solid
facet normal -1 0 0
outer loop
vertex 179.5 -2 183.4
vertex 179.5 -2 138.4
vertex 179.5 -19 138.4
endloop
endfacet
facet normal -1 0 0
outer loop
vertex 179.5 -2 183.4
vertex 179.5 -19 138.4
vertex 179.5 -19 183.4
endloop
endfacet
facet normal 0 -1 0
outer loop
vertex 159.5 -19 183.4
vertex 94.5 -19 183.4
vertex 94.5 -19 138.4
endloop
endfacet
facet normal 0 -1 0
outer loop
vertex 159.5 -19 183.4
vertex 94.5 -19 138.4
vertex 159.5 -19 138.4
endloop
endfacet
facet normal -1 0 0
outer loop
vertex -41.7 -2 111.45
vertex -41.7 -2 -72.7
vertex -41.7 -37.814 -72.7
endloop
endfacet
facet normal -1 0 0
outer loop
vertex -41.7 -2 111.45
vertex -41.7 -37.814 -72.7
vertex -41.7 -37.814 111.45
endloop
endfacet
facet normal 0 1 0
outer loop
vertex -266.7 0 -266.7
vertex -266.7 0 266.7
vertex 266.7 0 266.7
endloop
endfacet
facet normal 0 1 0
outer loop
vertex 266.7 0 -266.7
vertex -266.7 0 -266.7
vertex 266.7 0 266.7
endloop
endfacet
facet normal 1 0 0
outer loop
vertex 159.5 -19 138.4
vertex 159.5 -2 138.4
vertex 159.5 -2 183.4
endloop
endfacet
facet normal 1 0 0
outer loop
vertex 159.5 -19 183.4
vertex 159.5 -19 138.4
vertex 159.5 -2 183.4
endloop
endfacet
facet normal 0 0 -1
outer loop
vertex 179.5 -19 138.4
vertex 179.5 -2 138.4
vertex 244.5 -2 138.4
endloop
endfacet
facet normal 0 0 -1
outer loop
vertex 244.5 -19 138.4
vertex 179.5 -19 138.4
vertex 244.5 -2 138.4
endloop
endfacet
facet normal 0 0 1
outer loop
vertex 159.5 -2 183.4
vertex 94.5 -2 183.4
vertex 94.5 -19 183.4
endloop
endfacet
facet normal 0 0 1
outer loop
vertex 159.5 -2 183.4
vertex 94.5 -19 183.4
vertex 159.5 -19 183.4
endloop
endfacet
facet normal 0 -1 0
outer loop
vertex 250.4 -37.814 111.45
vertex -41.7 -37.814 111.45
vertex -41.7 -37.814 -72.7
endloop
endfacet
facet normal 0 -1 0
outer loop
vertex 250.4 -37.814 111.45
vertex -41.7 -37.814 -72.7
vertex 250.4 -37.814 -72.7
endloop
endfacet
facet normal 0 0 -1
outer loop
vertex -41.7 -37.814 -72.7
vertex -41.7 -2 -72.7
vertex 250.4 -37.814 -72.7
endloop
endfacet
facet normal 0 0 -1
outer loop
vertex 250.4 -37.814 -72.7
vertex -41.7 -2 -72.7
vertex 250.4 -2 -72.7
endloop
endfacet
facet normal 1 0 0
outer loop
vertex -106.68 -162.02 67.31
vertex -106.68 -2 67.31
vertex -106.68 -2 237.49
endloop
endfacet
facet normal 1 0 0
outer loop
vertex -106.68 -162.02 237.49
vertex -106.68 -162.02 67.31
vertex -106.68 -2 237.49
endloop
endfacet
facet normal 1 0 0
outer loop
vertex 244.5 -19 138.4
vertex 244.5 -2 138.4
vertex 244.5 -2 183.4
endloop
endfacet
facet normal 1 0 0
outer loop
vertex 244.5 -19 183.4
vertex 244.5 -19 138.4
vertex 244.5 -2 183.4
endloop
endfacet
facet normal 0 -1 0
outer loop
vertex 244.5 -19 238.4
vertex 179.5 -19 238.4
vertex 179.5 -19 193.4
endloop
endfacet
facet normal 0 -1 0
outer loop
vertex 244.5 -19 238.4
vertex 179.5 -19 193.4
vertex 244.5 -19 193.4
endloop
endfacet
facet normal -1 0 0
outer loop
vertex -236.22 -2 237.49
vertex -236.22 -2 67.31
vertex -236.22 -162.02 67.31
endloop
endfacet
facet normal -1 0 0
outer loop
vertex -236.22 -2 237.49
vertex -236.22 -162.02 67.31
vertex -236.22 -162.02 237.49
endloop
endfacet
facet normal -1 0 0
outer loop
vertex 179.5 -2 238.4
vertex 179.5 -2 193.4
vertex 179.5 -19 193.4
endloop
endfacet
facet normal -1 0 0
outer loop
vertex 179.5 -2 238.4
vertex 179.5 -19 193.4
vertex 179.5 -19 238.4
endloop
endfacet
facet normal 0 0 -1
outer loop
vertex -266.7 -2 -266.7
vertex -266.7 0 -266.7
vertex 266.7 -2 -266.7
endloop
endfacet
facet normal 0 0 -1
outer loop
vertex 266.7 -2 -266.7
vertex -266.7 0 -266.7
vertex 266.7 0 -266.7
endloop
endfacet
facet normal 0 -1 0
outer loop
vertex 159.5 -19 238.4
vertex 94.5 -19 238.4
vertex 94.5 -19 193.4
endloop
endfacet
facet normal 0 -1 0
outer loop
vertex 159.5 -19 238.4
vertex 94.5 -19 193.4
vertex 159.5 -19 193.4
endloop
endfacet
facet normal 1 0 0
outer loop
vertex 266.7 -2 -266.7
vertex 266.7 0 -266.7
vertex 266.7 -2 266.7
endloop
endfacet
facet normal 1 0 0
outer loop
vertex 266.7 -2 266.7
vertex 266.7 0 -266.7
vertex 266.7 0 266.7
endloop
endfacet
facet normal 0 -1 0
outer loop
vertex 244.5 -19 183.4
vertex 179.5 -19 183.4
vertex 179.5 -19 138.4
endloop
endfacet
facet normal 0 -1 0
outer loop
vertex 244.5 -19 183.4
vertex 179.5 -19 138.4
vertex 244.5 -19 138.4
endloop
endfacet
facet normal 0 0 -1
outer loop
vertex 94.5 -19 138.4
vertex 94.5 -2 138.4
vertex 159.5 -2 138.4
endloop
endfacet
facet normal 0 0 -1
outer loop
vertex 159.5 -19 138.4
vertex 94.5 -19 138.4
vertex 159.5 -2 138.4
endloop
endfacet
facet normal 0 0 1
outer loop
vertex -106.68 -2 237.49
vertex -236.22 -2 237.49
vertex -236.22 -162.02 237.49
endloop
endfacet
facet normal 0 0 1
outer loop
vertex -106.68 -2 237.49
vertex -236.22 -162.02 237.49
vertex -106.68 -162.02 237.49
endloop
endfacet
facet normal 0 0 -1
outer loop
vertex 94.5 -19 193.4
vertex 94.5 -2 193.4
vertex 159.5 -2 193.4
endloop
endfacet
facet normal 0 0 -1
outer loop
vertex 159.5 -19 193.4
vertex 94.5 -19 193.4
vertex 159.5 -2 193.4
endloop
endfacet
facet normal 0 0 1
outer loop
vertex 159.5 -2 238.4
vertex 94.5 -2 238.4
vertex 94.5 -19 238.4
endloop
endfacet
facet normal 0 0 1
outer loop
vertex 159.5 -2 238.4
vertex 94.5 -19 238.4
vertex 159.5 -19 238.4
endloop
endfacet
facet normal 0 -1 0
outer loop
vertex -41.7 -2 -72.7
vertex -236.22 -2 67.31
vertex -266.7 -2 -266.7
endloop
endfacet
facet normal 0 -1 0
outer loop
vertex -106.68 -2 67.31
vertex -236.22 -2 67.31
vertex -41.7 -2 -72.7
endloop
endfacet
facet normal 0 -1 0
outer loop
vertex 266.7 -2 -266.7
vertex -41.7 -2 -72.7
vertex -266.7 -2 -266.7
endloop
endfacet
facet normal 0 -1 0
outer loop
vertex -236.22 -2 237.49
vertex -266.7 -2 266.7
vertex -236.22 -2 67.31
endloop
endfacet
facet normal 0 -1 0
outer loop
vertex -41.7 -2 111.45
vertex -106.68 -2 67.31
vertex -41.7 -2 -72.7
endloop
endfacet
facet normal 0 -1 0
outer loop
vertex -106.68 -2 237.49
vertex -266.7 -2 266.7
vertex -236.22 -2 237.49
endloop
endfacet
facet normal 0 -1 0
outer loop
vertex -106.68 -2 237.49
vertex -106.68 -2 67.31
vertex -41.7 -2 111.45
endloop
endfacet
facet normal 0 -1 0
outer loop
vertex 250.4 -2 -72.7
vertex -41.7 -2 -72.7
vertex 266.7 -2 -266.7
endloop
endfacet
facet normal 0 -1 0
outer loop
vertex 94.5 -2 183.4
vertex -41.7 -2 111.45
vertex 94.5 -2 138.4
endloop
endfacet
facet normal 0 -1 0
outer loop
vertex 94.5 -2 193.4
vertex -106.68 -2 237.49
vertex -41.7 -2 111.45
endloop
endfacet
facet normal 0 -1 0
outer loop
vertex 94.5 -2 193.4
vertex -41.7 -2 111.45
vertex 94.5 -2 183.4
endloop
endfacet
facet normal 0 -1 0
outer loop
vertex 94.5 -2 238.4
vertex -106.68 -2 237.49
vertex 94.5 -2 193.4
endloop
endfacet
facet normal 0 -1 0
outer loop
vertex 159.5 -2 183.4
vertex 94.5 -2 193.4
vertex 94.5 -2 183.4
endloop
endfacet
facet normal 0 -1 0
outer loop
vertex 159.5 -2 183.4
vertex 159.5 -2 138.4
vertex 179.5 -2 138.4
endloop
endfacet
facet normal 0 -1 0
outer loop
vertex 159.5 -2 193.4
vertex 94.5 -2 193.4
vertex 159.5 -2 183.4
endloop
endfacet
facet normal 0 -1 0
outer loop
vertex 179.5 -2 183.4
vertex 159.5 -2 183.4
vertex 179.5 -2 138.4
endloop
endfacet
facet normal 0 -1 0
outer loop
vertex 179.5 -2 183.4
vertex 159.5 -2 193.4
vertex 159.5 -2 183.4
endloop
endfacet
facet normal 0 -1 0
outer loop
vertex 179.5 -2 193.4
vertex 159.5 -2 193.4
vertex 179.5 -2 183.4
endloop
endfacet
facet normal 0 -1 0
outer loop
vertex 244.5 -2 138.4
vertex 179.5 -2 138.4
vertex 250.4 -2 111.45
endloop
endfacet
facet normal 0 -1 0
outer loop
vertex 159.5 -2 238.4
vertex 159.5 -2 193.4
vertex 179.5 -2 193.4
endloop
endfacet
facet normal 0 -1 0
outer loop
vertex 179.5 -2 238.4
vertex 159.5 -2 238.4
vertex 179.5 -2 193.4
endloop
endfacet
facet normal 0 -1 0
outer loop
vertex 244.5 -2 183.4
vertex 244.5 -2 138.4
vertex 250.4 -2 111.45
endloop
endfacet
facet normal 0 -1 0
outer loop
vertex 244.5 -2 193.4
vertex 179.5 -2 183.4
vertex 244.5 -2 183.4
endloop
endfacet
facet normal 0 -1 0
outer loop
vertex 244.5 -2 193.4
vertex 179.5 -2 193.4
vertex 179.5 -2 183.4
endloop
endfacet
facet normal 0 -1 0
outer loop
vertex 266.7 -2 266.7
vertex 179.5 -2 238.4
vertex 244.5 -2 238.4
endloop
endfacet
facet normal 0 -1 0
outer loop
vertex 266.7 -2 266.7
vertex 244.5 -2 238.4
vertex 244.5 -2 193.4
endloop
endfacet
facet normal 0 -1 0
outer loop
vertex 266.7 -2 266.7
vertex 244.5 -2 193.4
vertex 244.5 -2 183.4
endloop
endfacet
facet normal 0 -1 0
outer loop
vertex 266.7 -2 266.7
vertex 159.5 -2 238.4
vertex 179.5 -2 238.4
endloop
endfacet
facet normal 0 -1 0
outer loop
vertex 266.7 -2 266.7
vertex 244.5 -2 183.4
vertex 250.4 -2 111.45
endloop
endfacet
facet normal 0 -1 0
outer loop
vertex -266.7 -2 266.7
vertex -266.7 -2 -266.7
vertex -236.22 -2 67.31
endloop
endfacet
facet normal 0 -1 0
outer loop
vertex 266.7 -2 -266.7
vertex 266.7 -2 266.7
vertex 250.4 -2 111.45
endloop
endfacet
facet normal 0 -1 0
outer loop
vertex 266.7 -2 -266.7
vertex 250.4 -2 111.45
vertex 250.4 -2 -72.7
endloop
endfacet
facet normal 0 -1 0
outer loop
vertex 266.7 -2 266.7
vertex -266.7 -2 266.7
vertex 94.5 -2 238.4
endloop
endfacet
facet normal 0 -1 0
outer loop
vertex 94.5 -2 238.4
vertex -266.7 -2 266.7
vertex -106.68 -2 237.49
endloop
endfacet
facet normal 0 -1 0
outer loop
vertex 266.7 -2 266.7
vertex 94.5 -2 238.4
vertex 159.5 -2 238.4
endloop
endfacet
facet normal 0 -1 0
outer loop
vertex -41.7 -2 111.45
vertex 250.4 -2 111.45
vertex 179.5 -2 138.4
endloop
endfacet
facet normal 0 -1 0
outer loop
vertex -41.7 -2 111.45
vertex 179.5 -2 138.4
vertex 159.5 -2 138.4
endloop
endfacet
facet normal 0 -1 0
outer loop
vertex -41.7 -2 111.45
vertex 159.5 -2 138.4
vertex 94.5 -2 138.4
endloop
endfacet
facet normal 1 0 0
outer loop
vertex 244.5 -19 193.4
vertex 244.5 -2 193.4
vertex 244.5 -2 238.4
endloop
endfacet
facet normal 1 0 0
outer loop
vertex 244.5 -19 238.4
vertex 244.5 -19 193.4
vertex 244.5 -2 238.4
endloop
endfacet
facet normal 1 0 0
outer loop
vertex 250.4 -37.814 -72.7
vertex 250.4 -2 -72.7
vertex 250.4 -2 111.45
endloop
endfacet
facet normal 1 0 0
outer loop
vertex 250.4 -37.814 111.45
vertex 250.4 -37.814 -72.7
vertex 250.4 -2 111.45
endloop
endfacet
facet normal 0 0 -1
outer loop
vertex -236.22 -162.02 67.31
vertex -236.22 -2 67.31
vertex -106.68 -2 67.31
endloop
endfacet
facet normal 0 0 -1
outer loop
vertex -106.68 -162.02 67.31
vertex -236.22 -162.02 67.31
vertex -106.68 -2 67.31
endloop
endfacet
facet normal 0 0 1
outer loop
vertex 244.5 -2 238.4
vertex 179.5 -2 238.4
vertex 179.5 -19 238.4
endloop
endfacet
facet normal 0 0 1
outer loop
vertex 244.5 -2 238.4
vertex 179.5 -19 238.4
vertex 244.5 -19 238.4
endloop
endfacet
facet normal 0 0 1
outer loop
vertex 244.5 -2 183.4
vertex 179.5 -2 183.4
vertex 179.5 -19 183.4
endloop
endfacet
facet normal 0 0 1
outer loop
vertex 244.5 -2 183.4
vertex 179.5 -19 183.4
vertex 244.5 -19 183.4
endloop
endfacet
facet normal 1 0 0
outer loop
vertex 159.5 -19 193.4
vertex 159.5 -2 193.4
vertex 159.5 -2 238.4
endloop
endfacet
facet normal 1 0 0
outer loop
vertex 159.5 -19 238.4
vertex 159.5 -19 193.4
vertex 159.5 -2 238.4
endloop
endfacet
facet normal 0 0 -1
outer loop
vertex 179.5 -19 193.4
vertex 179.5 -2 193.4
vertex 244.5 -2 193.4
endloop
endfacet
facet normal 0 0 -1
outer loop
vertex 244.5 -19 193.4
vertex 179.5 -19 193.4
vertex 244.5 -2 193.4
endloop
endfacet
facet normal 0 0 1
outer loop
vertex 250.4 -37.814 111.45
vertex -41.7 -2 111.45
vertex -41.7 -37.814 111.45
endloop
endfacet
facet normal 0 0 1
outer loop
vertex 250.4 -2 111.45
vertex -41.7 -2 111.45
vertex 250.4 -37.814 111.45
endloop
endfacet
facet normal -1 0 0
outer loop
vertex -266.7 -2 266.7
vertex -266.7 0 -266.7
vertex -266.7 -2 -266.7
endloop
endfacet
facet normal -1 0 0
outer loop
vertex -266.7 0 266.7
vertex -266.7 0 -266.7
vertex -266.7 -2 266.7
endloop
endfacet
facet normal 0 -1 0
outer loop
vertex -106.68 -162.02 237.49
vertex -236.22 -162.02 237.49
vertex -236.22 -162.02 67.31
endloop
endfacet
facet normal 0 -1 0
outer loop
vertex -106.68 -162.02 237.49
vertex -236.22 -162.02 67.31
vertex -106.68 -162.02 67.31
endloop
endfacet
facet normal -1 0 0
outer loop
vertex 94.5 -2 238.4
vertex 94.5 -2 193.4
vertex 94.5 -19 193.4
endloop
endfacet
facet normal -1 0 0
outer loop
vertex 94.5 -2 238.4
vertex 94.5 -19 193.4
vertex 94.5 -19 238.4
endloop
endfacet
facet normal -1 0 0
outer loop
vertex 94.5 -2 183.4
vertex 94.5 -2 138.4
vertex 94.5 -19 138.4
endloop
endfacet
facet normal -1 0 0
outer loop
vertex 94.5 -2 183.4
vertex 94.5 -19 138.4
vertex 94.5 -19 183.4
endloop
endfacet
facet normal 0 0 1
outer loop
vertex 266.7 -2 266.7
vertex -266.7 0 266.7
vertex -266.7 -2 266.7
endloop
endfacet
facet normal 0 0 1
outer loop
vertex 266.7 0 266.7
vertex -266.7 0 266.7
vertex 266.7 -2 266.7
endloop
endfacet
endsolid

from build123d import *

# Parameters (mm, degrees)
F0_W     = 533.4
F0_H     = 533.4
F1_DEPTH = 2
F2_W     = 292.1
F2_H     = 184.15
F3_DEPTH = 35.814
F4_W     = 65
F4_H     = 45
F5_DEPTH = 17
F6_W     = 129.54
F6_H     = 170.18
F7_DEPTH = 160.02


with BuildPart() as f1:
    # F0 (on Front) → F1 (new body)
    with BuildSketch(Plane.XZ):
        Rectangle(F0_W, F0_H)
    extrude(amount=F1_DEPTH)

    # F2 (on face) → F3 (join)
    with BuildSketch(Plane.XZ.offset(2)):
        with Locations((104.35, 19.375)):
            Rectangle(F2_W, F2_H)
    extrude(amount=F3_DEPTH)

    # F4 (on face) → F5 (join)
    with BuildSketch(Plane.XZ.offset(2)):
        with Locations((127, 215.9)):
            Rectangle(F4_W, F4_H)
        with Locations((127, 160.9)):
            Rectangle(F4_W, F4_H)
        with Locations((212, 160.9)):
            Rectangle(F4_W, F4_H)
        with Locations((212, 215.9)):
            Rectangle(F4_W, F4_H)
    extrude(amount=F5_DEPTH)

    # F6 (on face) → F7 (join)
    with BuildSketch(Plane.XZ.offset(2)):
        with Locations((-171.45, 152.4)):
            Rectangle(F6_W, F6_H)
    extrude(amount=F7_DEPTH)


solid = f1.part
